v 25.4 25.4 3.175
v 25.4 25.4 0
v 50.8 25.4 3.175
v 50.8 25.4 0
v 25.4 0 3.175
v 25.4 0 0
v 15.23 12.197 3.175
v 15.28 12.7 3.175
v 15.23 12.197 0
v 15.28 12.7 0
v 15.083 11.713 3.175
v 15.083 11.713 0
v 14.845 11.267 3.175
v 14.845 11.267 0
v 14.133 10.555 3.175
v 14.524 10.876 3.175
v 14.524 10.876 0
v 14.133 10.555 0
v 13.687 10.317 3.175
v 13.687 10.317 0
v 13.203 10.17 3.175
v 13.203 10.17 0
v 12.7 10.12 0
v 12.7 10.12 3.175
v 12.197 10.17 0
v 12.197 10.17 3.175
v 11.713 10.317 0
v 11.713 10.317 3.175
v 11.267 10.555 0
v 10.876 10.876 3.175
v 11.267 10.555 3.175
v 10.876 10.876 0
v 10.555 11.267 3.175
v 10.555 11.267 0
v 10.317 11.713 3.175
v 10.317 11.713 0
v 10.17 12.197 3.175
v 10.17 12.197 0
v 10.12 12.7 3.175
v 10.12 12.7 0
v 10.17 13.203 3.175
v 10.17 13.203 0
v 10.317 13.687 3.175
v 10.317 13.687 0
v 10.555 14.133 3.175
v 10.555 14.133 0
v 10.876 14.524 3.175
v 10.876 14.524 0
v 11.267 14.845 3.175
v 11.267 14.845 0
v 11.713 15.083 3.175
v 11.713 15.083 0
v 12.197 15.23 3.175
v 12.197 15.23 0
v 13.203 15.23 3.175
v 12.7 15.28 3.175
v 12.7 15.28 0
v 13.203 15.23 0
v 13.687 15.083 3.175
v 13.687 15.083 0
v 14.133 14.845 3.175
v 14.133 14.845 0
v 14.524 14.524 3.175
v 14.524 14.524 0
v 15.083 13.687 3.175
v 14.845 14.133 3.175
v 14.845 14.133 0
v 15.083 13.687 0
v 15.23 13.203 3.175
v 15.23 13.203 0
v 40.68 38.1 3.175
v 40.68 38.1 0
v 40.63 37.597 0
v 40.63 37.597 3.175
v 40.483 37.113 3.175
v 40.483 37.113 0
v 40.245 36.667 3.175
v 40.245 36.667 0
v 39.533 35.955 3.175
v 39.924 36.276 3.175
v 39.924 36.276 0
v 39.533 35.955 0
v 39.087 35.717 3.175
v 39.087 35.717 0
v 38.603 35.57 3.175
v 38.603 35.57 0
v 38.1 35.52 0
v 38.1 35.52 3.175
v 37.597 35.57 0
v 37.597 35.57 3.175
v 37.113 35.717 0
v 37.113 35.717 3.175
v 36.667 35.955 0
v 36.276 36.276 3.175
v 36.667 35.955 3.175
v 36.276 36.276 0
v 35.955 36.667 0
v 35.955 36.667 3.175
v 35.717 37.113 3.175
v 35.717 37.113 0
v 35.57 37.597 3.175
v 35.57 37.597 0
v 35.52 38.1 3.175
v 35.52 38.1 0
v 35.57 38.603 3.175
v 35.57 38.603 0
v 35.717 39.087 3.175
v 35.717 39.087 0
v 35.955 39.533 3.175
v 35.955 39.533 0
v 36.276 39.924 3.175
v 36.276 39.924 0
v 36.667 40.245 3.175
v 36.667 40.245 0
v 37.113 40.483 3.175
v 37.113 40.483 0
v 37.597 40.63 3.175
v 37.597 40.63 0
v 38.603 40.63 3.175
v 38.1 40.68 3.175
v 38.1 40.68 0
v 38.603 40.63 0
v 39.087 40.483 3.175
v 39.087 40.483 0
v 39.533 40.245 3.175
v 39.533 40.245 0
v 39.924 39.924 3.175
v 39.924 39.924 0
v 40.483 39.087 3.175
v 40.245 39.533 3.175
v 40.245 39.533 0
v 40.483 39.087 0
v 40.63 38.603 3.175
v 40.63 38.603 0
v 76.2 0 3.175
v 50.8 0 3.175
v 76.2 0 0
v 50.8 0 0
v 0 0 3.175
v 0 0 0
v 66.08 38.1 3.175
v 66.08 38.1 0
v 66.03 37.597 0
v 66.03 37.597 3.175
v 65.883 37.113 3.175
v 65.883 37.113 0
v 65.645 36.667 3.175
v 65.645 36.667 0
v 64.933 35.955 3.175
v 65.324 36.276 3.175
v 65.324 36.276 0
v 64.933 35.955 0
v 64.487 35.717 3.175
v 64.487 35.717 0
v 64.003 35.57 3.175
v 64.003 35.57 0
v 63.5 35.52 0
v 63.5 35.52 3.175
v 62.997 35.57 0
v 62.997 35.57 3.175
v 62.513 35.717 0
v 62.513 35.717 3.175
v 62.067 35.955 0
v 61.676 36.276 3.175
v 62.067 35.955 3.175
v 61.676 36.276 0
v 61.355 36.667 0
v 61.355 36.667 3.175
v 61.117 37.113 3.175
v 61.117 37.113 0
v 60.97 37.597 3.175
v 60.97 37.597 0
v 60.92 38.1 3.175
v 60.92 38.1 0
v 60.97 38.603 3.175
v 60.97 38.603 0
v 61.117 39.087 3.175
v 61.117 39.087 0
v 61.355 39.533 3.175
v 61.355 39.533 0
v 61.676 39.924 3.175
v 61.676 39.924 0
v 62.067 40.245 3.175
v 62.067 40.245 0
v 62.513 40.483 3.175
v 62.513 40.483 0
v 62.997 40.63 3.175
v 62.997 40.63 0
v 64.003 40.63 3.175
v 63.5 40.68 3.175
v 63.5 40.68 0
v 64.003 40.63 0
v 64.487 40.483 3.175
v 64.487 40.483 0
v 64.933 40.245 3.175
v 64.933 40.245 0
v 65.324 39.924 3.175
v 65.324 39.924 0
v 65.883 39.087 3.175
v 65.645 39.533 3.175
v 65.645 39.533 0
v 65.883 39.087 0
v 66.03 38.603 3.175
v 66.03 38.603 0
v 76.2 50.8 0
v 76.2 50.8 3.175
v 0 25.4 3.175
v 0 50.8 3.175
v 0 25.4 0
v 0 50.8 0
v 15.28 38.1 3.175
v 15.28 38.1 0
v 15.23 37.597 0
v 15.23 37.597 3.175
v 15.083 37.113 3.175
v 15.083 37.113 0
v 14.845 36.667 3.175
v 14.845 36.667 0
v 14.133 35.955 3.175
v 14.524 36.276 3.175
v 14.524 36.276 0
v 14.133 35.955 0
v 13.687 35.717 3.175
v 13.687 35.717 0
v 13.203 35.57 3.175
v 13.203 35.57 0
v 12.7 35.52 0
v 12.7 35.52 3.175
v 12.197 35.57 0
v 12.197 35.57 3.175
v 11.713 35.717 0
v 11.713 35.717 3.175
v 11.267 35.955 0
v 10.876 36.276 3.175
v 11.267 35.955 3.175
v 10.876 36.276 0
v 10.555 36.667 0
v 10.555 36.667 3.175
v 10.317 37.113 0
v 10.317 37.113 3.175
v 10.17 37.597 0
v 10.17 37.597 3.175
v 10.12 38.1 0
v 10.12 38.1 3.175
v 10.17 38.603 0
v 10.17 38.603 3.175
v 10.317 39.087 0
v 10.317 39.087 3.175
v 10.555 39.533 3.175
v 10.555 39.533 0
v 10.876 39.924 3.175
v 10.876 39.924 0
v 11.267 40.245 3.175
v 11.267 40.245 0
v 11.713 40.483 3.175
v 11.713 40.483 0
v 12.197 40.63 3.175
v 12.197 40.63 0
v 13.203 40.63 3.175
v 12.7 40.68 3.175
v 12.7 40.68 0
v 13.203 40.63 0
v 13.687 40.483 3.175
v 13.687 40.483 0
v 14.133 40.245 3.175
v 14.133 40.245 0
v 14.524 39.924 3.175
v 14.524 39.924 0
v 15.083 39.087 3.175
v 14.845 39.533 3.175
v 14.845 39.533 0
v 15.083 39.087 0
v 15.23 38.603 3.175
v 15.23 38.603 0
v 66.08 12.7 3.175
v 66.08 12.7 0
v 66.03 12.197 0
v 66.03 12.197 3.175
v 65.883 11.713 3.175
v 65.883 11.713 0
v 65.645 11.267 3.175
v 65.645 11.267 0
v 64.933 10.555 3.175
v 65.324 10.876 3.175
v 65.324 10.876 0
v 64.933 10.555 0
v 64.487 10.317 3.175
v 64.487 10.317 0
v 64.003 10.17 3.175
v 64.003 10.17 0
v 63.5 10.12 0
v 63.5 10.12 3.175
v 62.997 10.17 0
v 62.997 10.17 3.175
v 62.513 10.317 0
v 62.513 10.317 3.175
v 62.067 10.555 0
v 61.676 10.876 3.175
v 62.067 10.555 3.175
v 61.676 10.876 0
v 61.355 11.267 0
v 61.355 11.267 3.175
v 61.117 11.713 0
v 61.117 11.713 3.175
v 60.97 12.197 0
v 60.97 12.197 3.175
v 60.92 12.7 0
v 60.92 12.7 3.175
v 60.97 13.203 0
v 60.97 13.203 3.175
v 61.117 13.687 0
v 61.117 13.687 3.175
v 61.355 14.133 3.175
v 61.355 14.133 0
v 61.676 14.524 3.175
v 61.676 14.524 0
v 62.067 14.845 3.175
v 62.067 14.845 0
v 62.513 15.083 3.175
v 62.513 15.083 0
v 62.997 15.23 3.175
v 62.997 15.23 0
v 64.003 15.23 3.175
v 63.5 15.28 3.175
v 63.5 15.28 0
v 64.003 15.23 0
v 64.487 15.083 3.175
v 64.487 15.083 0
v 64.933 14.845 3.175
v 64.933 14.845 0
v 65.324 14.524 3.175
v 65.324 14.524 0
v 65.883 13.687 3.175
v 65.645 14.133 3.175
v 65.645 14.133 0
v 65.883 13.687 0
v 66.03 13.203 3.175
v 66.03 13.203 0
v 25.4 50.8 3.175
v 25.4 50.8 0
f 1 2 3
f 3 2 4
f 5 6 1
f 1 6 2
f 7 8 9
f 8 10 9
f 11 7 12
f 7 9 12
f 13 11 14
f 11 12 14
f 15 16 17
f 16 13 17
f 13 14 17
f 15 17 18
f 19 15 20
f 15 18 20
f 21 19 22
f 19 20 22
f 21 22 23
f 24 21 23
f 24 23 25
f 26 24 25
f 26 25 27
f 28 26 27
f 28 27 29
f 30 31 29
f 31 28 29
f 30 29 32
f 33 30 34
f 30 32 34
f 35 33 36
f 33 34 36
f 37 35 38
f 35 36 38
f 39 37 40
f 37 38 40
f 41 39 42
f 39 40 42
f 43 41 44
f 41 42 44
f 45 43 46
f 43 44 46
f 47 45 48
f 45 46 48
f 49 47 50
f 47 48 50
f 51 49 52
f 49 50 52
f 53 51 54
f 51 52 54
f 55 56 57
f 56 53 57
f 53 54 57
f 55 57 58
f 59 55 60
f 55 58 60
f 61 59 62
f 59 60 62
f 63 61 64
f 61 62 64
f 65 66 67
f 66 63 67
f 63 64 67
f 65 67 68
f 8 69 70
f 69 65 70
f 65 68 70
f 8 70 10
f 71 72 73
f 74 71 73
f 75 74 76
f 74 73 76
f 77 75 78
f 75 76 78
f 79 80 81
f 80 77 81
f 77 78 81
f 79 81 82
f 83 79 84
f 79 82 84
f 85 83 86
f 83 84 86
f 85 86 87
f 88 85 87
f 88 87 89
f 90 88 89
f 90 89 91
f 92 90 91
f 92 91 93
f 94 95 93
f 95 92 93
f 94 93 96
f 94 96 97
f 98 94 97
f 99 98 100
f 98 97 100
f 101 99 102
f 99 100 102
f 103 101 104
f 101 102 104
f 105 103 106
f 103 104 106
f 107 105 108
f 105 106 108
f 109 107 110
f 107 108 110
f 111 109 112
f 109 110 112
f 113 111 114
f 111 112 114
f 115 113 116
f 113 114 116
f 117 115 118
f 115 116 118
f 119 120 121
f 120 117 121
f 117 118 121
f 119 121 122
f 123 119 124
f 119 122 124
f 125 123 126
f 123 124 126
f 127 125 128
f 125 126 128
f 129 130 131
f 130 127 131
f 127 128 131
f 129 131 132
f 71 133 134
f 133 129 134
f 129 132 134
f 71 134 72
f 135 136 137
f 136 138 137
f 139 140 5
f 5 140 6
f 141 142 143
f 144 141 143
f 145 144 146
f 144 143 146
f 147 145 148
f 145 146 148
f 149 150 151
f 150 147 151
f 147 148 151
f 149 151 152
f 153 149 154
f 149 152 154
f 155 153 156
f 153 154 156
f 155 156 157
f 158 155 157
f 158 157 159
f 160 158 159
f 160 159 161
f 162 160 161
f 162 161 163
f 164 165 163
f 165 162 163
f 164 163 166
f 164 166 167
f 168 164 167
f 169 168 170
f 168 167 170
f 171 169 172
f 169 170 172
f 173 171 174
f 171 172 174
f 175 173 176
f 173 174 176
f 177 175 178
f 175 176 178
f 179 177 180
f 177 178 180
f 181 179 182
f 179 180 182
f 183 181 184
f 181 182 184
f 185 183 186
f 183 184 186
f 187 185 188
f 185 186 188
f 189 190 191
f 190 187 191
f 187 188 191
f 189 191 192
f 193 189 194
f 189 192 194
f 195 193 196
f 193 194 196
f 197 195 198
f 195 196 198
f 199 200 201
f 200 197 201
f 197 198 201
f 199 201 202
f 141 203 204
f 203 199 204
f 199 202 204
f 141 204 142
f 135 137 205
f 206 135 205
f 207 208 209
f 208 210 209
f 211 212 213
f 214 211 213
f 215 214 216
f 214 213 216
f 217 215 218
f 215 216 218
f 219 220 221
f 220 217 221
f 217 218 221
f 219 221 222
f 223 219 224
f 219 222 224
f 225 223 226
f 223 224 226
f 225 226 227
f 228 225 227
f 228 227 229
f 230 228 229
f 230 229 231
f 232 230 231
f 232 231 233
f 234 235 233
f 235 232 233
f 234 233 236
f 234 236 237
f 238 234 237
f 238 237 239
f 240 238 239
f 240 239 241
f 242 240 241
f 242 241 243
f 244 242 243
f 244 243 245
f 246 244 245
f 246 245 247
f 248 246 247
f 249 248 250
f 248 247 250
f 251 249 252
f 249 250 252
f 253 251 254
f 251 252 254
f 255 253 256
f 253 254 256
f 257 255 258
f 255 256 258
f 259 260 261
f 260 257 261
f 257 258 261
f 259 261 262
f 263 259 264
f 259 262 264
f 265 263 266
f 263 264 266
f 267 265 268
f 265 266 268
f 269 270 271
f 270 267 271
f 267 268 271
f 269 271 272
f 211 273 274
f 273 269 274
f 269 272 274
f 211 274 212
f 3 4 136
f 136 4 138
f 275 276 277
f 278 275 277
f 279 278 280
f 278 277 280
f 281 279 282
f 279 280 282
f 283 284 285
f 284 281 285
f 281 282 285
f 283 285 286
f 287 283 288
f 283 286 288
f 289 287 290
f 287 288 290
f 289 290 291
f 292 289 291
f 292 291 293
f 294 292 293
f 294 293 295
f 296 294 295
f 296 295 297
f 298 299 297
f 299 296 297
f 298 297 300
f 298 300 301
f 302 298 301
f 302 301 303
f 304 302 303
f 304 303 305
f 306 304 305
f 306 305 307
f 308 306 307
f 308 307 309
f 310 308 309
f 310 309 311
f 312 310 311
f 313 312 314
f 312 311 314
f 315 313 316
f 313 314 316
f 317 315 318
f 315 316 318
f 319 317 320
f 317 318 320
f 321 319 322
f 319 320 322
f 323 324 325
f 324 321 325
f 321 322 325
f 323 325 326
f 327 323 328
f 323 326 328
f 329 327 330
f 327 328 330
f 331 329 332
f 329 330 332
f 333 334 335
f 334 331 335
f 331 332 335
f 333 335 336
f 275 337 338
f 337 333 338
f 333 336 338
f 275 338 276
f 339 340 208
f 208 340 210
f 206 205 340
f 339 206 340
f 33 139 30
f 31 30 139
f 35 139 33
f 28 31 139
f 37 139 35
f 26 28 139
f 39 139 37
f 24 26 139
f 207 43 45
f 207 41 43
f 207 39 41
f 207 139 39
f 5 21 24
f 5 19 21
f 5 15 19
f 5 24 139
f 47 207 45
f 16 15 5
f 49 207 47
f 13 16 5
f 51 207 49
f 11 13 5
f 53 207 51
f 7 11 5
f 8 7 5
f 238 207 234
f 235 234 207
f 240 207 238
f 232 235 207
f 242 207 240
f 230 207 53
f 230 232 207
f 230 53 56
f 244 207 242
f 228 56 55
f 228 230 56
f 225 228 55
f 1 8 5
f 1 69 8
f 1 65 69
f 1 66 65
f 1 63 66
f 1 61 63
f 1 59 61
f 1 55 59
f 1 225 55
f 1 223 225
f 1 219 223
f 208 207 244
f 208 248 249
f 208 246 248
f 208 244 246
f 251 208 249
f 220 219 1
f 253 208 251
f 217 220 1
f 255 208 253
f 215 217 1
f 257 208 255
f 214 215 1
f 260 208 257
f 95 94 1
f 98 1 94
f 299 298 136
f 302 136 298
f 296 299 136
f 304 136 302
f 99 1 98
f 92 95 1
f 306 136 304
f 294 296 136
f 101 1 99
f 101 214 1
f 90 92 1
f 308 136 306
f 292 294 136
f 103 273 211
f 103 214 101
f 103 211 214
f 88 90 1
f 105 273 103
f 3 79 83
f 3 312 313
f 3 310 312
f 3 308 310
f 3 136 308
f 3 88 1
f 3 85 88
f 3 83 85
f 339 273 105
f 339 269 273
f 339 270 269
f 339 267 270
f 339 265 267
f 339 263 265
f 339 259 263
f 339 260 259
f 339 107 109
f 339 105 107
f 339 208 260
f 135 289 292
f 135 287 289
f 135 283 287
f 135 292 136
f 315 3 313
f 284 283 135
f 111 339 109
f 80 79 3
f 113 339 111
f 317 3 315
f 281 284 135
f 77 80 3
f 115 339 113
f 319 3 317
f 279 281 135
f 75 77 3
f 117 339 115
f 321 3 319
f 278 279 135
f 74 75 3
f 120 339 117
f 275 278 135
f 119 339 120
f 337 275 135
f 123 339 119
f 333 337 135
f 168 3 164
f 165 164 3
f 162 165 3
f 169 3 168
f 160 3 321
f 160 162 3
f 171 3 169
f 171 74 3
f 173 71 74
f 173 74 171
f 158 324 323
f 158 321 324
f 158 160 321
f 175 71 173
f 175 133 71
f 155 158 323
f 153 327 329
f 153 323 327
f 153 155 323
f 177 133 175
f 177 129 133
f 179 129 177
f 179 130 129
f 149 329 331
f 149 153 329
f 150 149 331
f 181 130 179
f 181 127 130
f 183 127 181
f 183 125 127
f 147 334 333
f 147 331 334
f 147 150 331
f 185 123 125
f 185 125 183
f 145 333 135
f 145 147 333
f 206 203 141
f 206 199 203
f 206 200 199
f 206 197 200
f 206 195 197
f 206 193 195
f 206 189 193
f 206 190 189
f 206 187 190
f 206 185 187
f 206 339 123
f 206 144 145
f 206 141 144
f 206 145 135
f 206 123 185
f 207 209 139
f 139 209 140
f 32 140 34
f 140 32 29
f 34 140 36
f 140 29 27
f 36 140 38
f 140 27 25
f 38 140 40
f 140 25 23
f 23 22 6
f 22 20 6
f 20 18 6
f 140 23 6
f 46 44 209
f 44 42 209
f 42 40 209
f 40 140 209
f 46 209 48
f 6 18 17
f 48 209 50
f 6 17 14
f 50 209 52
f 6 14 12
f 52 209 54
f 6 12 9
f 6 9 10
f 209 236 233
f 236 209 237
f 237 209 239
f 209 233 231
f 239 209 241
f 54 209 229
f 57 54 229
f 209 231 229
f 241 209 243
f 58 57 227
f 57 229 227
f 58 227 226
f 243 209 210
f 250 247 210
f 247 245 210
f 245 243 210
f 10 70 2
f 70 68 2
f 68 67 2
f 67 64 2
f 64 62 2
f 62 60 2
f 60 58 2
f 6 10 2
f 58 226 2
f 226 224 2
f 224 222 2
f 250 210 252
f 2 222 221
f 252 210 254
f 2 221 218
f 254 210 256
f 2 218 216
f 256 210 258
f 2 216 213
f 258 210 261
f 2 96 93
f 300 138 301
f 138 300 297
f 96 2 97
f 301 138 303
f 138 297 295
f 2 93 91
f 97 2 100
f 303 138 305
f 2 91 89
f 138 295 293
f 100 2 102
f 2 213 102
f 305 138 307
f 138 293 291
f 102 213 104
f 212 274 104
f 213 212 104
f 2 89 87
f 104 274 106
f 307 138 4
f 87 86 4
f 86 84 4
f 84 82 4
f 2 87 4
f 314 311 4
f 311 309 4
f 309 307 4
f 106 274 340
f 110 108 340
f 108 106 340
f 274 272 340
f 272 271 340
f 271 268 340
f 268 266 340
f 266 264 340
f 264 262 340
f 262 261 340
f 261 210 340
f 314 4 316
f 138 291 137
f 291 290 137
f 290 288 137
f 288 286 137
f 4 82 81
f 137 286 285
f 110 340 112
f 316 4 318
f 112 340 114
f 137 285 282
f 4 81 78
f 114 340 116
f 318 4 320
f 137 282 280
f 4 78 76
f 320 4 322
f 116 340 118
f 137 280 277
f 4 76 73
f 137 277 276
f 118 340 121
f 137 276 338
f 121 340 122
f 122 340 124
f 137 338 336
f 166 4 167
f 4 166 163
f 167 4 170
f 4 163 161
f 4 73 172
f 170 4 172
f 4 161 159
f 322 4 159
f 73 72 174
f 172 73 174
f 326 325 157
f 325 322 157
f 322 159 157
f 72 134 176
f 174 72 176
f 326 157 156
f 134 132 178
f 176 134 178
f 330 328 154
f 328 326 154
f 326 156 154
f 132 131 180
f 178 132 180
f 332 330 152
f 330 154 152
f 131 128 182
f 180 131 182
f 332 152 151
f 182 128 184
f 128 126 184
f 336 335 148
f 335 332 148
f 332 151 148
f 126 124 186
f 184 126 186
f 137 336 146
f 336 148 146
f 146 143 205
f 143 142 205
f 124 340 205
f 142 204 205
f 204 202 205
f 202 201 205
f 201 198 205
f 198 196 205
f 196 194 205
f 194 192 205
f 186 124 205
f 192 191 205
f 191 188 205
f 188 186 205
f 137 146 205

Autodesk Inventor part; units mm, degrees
ref_plane "YZ Plane" through (0, 0, 0) normal (1, 0, 0) x (0, 1, 0)
ref_plane "XZ Plane" through (0, 0, 0) normal (0, 1, 0) x (-1, 0, 0)
ref_plane "XY Plane" through (0, 0, 0) normal (0, 0, 1) x (1, 0, 0)
sketch "Sketch1" plane through (0, 0, 0) normal (0, 0, 1) x (1, 0, 0)
  line L0 (0, 0) -> (25.4, 0)
  line L1 (25.4, 0) -> (25.4, 25.4)
  line L2 (25.4, 50.8) -> (0, 50.8)
  line L3 (0, 50.8) -> (0, 0)
  line L4 (0, 25.4) -> (0, 50.8)
  line L5 (12.7, 0) -> (12.7, 12.7) construction
  line L6 (12.7, 12.7) -> (12.7, 38.1) construction
  line L7 (12.7, 38.1) -> (38.1, 38.1) construction
  circle A0 centre (12.7, 12.7) radius 2.5797
  circle A1 centre (12.7, 38.1) radius 2.5797
  circle A2 centre (38.1, 38.1) radius 2.5797
  line L8 (25.4, 25.4) -> (50.8, 25.4)
  line L9 (50.8, 25.4) -> (50.8, 0)
  line L10 (50.8, 0) -> (76.2, 0)
  line L11 (76.2, 0) -> (76.2, 50.8)
  line L12 (76.2, 50.8) -> (25.4, 50.8)
  line L13 (38.1, 38.1) -> (63.5, 38.1) construction
  line L14 (63.5, 38.1) -> (63.5, 12.7) construction
  circle A3 centre (63.5, 38.1) radius 2.5797
  circle A4 centre (63.5, 12.7) radius 2.5797
  dimension "d0" = 25.4
  dimension "d1" = 50.8
  dimension "d5" = 12.7
  dimension "d6" = 25.4
  dimension "d7" = 25.4
  dimension "d11" = 5.1594
  dimension "d14" = 25.4
  dimension "d15" = 25.4
  dimension "d16" = 25.4
  dimension "d17" = 25.4
extrude "Extrusion2" add sketch "Sketch1" along normal blind 3.175
properties part number "C-Bracket"
